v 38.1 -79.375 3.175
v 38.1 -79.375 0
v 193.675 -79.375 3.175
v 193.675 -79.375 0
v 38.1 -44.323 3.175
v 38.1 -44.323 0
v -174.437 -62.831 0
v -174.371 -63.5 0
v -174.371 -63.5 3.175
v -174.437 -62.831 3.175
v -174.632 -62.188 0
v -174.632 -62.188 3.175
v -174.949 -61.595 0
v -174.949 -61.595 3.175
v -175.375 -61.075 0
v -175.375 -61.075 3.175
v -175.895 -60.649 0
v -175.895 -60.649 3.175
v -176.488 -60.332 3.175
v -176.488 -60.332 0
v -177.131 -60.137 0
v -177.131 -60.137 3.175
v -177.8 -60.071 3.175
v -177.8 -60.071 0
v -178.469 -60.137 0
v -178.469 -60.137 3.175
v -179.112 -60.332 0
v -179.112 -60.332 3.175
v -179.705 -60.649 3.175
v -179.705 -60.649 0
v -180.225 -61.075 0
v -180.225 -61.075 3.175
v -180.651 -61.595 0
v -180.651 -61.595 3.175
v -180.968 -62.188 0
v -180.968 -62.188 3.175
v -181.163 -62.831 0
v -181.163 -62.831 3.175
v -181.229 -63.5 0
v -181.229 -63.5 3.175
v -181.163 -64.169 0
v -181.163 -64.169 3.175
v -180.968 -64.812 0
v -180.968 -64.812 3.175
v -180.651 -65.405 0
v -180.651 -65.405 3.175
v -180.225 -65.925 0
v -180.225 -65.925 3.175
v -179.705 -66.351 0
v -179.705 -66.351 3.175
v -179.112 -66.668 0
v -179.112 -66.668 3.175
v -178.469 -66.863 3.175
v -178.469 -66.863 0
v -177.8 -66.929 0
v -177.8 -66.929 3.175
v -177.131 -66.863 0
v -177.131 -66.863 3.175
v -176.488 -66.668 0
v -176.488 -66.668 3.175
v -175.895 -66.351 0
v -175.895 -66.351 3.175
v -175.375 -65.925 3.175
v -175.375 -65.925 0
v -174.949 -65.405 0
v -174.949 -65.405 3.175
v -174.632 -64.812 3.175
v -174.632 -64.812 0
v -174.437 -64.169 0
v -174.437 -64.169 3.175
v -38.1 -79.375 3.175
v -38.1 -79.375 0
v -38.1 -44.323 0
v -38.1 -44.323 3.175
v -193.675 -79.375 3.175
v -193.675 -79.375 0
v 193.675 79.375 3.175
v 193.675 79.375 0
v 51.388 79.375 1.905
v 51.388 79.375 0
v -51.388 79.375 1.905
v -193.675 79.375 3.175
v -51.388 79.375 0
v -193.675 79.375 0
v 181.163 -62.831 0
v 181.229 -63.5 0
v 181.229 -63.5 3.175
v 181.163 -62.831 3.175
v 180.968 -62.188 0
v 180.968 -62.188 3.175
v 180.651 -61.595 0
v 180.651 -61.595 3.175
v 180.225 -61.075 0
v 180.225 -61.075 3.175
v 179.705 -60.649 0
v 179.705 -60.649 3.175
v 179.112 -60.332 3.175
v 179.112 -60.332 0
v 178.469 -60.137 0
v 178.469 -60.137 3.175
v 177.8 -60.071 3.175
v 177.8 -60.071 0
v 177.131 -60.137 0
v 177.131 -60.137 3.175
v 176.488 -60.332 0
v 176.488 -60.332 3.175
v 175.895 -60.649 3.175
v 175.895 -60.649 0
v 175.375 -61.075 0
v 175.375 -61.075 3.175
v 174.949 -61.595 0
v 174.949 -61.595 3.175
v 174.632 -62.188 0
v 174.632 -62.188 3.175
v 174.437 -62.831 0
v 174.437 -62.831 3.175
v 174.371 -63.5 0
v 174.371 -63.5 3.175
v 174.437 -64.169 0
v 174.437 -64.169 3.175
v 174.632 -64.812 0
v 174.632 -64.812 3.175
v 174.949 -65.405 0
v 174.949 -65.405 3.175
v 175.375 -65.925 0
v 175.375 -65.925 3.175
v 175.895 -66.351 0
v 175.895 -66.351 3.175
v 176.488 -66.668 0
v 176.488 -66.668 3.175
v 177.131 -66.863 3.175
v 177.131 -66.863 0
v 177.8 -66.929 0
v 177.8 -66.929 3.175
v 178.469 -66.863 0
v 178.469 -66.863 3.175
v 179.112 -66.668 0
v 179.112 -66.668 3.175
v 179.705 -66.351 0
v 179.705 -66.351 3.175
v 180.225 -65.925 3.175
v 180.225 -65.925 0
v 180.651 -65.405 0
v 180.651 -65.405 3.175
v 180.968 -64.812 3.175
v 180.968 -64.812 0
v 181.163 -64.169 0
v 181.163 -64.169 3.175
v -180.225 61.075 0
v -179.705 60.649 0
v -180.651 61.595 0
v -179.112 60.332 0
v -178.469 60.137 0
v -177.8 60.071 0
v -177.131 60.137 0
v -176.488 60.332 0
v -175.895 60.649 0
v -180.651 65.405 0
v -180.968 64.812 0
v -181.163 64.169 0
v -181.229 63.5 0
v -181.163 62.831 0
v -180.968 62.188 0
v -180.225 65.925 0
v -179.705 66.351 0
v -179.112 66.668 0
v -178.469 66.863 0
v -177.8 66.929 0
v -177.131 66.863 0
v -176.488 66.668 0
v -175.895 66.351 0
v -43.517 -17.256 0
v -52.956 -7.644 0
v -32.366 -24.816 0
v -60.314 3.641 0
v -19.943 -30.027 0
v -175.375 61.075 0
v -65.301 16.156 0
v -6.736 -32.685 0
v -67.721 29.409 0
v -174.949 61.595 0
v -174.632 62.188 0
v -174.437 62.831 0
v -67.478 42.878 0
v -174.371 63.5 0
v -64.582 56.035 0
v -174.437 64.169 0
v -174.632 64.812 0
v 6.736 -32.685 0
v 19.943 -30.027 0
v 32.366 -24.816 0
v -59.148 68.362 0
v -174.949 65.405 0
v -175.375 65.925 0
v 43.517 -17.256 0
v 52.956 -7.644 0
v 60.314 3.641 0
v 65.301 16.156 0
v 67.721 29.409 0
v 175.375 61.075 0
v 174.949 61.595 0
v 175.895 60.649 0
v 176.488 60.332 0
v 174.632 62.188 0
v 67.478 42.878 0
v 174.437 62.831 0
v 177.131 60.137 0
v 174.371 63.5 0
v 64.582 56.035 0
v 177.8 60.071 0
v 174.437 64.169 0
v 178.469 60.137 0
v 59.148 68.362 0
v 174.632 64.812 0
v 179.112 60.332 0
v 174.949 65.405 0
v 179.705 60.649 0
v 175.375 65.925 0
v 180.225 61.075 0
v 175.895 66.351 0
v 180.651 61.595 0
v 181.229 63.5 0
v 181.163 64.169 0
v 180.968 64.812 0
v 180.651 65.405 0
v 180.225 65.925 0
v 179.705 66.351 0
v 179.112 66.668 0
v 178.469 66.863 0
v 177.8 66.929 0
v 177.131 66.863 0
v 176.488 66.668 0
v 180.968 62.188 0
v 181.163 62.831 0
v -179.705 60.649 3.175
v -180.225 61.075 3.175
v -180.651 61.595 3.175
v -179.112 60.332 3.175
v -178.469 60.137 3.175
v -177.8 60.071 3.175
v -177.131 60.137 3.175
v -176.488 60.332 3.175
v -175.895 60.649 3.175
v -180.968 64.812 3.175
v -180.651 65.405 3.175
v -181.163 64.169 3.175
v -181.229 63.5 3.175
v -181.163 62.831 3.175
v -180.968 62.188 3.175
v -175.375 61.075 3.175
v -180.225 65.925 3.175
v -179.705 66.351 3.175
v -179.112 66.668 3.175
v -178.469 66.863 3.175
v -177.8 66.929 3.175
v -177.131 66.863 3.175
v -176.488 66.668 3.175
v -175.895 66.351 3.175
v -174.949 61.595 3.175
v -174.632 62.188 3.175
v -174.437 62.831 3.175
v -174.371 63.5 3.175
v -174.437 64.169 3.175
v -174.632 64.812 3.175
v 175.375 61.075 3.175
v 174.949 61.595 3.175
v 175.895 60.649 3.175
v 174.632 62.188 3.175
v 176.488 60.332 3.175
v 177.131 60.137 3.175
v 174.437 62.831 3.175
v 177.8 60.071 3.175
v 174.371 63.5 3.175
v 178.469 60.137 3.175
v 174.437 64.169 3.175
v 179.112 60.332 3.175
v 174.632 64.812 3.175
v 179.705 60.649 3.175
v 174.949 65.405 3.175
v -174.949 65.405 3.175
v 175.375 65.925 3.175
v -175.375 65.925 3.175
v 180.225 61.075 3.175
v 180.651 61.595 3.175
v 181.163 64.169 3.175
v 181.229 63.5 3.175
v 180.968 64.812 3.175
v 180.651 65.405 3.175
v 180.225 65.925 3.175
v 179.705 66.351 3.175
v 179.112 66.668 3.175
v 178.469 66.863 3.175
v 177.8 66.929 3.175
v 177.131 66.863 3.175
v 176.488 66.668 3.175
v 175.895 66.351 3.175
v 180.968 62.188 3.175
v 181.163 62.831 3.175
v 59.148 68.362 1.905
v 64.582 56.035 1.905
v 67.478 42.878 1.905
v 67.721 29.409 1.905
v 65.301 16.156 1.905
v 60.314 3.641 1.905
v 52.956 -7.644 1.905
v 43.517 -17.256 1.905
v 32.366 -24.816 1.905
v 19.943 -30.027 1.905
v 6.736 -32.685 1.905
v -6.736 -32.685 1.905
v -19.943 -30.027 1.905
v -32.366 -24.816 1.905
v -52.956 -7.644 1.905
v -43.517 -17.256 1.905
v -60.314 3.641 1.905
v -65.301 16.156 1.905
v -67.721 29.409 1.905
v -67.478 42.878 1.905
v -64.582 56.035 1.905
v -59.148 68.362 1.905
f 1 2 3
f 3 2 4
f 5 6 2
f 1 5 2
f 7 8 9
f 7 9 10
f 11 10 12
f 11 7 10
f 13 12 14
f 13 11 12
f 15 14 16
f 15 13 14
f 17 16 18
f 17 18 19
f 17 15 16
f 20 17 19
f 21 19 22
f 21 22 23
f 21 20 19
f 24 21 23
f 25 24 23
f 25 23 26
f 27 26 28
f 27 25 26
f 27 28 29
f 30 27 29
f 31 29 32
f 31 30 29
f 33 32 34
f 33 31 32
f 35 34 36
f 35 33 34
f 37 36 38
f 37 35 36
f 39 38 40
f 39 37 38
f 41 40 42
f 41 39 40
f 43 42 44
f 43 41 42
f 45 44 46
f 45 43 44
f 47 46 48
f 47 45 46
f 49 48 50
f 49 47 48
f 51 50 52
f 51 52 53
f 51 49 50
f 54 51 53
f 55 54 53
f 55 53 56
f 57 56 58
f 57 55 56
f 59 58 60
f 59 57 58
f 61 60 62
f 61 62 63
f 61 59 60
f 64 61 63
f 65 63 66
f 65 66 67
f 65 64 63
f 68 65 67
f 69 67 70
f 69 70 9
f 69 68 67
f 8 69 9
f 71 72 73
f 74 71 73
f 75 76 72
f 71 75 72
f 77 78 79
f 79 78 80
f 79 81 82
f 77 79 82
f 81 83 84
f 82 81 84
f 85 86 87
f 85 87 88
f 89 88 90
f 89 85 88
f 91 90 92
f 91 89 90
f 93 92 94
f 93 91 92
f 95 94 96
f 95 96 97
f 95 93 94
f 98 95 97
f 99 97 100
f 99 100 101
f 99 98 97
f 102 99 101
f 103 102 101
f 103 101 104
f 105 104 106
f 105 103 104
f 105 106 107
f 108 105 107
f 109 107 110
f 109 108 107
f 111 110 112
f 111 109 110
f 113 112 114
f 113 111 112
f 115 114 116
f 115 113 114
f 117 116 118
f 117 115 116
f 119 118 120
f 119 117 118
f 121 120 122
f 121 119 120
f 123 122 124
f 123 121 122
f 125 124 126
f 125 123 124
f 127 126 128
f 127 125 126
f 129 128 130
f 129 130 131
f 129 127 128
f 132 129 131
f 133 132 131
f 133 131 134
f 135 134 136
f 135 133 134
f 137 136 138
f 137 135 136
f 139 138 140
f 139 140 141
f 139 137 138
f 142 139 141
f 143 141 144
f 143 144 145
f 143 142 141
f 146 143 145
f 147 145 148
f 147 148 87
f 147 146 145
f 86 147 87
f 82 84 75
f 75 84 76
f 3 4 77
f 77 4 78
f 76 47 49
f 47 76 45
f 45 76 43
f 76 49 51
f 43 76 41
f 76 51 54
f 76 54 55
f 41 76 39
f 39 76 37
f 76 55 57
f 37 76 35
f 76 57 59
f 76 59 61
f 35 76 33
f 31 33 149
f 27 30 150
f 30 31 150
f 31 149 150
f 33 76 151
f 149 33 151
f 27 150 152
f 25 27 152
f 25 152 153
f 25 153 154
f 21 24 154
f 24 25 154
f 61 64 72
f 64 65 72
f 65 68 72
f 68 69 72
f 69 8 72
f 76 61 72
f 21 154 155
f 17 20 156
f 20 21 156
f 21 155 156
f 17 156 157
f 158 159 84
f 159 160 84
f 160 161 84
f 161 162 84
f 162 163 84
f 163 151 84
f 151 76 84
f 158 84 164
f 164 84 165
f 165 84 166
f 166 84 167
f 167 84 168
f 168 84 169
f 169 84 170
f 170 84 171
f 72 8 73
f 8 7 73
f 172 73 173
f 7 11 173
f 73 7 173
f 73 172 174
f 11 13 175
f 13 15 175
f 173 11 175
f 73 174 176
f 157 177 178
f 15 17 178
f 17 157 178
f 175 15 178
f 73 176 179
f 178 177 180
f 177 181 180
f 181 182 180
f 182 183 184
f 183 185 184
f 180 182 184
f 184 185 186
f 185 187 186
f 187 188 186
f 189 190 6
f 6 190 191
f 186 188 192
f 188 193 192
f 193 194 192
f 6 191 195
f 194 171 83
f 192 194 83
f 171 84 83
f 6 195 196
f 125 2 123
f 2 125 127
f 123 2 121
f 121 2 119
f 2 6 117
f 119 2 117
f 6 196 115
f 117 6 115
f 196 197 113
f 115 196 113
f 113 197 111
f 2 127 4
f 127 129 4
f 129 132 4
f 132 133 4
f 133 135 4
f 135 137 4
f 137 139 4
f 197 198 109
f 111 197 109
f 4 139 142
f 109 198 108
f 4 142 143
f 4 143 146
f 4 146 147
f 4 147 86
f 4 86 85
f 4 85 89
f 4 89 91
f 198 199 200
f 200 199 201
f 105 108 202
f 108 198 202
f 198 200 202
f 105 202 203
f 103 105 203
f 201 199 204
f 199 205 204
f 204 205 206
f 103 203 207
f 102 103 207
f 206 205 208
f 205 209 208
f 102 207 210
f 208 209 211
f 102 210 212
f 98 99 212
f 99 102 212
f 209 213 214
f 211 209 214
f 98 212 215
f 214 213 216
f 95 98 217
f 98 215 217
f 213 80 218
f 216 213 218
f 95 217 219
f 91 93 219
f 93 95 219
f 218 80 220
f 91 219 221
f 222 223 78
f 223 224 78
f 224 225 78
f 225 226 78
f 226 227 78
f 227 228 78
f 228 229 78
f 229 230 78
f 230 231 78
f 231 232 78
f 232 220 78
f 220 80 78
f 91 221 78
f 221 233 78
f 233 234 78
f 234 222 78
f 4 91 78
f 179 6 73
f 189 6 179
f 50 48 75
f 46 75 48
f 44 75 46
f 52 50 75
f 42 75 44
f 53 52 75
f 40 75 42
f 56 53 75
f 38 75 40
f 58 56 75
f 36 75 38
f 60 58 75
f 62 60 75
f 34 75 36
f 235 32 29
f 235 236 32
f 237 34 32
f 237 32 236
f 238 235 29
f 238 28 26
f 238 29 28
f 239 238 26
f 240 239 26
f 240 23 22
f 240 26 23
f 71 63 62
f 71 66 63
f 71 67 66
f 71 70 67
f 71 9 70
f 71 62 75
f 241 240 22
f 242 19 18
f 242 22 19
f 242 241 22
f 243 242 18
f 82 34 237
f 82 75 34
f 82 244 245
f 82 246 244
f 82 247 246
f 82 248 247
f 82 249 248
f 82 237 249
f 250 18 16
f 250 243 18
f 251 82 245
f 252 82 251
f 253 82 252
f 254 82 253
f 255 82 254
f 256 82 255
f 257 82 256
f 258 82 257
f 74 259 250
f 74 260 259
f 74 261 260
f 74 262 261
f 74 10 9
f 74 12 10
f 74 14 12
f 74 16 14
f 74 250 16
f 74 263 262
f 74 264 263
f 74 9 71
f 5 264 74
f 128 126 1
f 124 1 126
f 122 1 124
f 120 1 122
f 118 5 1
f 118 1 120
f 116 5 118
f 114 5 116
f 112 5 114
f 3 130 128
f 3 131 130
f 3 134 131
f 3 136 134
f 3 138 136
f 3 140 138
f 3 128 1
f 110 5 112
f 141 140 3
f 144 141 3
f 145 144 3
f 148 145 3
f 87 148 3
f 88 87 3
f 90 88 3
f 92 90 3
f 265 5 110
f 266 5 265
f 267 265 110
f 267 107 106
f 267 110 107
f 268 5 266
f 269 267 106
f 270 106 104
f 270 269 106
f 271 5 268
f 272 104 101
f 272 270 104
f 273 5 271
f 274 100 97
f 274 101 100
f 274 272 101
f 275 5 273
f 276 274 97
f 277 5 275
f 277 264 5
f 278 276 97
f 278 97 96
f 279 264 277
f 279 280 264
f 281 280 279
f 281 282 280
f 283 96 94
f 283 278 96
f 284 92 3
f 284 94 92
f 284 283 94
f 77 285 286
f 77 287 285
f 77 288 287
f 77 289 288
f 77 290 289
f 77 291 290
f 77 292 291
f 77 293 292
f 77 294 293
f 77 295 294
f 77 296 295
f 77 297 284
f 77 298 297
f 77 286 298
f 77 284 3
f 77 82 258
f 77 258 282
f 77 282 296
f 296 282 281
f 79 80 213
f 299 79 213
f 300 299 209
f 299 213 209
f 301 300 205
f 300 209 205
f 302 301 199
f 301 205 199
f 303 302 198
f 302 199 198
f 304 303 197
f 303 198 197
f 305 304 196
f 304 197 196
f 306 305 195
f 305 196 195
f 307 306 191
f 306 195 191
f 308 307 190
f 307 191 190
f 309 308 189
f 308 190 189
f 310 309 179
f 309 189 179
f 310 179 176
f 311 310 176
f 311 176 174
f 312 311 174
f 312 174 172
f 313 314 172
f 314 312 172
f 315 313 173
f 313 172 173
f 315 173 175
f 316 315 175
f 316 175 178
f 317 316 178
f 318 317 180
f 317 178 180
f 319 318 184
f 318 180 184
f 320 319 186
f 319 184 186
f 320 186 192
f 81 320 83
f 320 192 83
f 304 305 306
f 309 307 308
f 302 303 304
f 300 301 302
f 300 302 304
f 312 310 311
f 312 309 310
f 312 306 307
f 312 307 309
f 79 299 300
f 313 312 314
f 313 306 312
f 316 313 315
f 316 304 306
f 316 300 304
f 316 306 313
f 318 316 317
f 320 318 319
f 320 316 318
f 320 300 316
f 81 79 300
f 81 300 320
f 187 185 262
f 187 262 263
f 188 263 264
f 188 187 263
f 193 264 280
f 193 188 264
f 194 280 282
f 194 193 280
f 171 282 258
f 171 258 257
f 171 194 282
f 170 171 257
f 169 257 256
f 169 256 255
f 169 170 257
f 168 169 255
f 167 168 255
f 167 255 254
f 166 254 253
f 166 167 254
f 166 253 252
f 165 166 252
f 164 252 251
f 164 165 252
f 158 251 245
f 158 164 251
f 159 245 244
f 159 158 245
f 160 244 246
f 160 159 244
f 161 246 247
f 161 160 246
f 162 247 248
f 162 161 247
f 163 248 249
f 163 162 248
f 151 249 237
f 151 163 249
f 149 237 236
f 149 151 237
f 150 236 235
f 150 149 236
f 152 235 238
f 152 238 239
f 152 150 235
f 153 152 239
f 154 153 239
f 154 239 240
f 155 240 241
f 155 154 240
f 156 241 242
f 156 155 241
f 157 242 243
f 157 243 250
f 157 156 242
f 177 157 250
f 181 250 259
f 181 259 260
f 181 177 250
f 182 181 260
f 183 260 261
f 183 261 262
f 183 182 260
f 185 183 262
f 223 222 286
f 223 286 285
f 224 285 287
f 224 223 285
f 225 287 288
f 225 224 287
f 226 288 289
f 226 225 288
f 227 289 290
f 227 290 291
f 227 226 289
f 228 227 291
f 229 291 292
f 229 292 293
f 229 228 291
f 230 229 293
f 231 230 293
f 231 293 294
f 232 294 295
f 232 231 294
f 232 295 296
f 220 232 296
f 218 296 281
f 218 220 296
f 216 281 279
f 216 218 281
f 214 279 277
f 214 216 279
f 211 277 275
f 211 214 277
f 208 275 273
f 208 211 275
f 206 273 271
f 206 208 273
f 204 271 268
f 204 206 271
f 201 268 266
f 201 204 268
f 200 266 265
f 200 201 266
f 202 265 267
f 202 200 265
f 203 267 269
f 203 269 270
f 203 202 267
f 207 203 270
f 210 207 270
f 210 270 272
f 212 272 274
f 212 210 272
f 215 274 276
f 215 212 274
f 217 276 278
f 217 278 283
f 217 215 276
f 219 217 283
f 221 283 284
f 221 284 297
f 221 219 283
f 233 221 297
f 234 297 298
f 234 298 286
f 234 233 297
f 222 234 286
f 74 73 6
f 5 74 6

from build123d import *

# Parameters (mm, degrees)
SKETCH1_R           = 3.429
BOSS_EXTRUDE1_DEPTH = 3.175
SKETCH3_R           = 67.945
CUT_EXTRUDE2_DEPTH  = 1.905


with BuildPart() as part:
    # Sketch1 → Boss-Extrude1 (new body)
    with BuildSketch(Plane.XY):
        Polygon((38.1, -79.375), (193.675, -79.375), (193.675, 79.375), (-193.675, 79.375), (-193.675, -79.375), (-38.1, -79.375), (-38.1, -44.323), (38.1, -44.323), align=None)
        with Locations((-177.8, 63.5)):
            Circle(SKETCH1_R, mode=Mode.SUBTRACT)
        with Locations((177.8, 63.5)):
            Circle(SKETCH1_R, mode=Mode.SUBTRACT)
        with Locations((177.8, -63.5)):
            Circle(SKETCH1_R, mode=Mode.SUBTRACT)
        with Locations((-177.8, -63.5)):
            Circle(SKETCH1_R, mode=Mode.SUBTRACT)
    extrude(amount=BOSS_EXTRUDE1_DEPTH)

    # Sketch3 → Cut-Extrude2 (cut)
    with BuildSketch(Plane(origin=(0, 0, 0), x_dir=(-1, 0, 0), z_dir=(0, 0, -1))):
        with Locations((0, 34.925)):
            Circle(SKETCH3_R)
    extrude(amount=-CUT_EXTRUDE2_DEPTH, mode=Mode.SUBTRACT)


solid = part.part
